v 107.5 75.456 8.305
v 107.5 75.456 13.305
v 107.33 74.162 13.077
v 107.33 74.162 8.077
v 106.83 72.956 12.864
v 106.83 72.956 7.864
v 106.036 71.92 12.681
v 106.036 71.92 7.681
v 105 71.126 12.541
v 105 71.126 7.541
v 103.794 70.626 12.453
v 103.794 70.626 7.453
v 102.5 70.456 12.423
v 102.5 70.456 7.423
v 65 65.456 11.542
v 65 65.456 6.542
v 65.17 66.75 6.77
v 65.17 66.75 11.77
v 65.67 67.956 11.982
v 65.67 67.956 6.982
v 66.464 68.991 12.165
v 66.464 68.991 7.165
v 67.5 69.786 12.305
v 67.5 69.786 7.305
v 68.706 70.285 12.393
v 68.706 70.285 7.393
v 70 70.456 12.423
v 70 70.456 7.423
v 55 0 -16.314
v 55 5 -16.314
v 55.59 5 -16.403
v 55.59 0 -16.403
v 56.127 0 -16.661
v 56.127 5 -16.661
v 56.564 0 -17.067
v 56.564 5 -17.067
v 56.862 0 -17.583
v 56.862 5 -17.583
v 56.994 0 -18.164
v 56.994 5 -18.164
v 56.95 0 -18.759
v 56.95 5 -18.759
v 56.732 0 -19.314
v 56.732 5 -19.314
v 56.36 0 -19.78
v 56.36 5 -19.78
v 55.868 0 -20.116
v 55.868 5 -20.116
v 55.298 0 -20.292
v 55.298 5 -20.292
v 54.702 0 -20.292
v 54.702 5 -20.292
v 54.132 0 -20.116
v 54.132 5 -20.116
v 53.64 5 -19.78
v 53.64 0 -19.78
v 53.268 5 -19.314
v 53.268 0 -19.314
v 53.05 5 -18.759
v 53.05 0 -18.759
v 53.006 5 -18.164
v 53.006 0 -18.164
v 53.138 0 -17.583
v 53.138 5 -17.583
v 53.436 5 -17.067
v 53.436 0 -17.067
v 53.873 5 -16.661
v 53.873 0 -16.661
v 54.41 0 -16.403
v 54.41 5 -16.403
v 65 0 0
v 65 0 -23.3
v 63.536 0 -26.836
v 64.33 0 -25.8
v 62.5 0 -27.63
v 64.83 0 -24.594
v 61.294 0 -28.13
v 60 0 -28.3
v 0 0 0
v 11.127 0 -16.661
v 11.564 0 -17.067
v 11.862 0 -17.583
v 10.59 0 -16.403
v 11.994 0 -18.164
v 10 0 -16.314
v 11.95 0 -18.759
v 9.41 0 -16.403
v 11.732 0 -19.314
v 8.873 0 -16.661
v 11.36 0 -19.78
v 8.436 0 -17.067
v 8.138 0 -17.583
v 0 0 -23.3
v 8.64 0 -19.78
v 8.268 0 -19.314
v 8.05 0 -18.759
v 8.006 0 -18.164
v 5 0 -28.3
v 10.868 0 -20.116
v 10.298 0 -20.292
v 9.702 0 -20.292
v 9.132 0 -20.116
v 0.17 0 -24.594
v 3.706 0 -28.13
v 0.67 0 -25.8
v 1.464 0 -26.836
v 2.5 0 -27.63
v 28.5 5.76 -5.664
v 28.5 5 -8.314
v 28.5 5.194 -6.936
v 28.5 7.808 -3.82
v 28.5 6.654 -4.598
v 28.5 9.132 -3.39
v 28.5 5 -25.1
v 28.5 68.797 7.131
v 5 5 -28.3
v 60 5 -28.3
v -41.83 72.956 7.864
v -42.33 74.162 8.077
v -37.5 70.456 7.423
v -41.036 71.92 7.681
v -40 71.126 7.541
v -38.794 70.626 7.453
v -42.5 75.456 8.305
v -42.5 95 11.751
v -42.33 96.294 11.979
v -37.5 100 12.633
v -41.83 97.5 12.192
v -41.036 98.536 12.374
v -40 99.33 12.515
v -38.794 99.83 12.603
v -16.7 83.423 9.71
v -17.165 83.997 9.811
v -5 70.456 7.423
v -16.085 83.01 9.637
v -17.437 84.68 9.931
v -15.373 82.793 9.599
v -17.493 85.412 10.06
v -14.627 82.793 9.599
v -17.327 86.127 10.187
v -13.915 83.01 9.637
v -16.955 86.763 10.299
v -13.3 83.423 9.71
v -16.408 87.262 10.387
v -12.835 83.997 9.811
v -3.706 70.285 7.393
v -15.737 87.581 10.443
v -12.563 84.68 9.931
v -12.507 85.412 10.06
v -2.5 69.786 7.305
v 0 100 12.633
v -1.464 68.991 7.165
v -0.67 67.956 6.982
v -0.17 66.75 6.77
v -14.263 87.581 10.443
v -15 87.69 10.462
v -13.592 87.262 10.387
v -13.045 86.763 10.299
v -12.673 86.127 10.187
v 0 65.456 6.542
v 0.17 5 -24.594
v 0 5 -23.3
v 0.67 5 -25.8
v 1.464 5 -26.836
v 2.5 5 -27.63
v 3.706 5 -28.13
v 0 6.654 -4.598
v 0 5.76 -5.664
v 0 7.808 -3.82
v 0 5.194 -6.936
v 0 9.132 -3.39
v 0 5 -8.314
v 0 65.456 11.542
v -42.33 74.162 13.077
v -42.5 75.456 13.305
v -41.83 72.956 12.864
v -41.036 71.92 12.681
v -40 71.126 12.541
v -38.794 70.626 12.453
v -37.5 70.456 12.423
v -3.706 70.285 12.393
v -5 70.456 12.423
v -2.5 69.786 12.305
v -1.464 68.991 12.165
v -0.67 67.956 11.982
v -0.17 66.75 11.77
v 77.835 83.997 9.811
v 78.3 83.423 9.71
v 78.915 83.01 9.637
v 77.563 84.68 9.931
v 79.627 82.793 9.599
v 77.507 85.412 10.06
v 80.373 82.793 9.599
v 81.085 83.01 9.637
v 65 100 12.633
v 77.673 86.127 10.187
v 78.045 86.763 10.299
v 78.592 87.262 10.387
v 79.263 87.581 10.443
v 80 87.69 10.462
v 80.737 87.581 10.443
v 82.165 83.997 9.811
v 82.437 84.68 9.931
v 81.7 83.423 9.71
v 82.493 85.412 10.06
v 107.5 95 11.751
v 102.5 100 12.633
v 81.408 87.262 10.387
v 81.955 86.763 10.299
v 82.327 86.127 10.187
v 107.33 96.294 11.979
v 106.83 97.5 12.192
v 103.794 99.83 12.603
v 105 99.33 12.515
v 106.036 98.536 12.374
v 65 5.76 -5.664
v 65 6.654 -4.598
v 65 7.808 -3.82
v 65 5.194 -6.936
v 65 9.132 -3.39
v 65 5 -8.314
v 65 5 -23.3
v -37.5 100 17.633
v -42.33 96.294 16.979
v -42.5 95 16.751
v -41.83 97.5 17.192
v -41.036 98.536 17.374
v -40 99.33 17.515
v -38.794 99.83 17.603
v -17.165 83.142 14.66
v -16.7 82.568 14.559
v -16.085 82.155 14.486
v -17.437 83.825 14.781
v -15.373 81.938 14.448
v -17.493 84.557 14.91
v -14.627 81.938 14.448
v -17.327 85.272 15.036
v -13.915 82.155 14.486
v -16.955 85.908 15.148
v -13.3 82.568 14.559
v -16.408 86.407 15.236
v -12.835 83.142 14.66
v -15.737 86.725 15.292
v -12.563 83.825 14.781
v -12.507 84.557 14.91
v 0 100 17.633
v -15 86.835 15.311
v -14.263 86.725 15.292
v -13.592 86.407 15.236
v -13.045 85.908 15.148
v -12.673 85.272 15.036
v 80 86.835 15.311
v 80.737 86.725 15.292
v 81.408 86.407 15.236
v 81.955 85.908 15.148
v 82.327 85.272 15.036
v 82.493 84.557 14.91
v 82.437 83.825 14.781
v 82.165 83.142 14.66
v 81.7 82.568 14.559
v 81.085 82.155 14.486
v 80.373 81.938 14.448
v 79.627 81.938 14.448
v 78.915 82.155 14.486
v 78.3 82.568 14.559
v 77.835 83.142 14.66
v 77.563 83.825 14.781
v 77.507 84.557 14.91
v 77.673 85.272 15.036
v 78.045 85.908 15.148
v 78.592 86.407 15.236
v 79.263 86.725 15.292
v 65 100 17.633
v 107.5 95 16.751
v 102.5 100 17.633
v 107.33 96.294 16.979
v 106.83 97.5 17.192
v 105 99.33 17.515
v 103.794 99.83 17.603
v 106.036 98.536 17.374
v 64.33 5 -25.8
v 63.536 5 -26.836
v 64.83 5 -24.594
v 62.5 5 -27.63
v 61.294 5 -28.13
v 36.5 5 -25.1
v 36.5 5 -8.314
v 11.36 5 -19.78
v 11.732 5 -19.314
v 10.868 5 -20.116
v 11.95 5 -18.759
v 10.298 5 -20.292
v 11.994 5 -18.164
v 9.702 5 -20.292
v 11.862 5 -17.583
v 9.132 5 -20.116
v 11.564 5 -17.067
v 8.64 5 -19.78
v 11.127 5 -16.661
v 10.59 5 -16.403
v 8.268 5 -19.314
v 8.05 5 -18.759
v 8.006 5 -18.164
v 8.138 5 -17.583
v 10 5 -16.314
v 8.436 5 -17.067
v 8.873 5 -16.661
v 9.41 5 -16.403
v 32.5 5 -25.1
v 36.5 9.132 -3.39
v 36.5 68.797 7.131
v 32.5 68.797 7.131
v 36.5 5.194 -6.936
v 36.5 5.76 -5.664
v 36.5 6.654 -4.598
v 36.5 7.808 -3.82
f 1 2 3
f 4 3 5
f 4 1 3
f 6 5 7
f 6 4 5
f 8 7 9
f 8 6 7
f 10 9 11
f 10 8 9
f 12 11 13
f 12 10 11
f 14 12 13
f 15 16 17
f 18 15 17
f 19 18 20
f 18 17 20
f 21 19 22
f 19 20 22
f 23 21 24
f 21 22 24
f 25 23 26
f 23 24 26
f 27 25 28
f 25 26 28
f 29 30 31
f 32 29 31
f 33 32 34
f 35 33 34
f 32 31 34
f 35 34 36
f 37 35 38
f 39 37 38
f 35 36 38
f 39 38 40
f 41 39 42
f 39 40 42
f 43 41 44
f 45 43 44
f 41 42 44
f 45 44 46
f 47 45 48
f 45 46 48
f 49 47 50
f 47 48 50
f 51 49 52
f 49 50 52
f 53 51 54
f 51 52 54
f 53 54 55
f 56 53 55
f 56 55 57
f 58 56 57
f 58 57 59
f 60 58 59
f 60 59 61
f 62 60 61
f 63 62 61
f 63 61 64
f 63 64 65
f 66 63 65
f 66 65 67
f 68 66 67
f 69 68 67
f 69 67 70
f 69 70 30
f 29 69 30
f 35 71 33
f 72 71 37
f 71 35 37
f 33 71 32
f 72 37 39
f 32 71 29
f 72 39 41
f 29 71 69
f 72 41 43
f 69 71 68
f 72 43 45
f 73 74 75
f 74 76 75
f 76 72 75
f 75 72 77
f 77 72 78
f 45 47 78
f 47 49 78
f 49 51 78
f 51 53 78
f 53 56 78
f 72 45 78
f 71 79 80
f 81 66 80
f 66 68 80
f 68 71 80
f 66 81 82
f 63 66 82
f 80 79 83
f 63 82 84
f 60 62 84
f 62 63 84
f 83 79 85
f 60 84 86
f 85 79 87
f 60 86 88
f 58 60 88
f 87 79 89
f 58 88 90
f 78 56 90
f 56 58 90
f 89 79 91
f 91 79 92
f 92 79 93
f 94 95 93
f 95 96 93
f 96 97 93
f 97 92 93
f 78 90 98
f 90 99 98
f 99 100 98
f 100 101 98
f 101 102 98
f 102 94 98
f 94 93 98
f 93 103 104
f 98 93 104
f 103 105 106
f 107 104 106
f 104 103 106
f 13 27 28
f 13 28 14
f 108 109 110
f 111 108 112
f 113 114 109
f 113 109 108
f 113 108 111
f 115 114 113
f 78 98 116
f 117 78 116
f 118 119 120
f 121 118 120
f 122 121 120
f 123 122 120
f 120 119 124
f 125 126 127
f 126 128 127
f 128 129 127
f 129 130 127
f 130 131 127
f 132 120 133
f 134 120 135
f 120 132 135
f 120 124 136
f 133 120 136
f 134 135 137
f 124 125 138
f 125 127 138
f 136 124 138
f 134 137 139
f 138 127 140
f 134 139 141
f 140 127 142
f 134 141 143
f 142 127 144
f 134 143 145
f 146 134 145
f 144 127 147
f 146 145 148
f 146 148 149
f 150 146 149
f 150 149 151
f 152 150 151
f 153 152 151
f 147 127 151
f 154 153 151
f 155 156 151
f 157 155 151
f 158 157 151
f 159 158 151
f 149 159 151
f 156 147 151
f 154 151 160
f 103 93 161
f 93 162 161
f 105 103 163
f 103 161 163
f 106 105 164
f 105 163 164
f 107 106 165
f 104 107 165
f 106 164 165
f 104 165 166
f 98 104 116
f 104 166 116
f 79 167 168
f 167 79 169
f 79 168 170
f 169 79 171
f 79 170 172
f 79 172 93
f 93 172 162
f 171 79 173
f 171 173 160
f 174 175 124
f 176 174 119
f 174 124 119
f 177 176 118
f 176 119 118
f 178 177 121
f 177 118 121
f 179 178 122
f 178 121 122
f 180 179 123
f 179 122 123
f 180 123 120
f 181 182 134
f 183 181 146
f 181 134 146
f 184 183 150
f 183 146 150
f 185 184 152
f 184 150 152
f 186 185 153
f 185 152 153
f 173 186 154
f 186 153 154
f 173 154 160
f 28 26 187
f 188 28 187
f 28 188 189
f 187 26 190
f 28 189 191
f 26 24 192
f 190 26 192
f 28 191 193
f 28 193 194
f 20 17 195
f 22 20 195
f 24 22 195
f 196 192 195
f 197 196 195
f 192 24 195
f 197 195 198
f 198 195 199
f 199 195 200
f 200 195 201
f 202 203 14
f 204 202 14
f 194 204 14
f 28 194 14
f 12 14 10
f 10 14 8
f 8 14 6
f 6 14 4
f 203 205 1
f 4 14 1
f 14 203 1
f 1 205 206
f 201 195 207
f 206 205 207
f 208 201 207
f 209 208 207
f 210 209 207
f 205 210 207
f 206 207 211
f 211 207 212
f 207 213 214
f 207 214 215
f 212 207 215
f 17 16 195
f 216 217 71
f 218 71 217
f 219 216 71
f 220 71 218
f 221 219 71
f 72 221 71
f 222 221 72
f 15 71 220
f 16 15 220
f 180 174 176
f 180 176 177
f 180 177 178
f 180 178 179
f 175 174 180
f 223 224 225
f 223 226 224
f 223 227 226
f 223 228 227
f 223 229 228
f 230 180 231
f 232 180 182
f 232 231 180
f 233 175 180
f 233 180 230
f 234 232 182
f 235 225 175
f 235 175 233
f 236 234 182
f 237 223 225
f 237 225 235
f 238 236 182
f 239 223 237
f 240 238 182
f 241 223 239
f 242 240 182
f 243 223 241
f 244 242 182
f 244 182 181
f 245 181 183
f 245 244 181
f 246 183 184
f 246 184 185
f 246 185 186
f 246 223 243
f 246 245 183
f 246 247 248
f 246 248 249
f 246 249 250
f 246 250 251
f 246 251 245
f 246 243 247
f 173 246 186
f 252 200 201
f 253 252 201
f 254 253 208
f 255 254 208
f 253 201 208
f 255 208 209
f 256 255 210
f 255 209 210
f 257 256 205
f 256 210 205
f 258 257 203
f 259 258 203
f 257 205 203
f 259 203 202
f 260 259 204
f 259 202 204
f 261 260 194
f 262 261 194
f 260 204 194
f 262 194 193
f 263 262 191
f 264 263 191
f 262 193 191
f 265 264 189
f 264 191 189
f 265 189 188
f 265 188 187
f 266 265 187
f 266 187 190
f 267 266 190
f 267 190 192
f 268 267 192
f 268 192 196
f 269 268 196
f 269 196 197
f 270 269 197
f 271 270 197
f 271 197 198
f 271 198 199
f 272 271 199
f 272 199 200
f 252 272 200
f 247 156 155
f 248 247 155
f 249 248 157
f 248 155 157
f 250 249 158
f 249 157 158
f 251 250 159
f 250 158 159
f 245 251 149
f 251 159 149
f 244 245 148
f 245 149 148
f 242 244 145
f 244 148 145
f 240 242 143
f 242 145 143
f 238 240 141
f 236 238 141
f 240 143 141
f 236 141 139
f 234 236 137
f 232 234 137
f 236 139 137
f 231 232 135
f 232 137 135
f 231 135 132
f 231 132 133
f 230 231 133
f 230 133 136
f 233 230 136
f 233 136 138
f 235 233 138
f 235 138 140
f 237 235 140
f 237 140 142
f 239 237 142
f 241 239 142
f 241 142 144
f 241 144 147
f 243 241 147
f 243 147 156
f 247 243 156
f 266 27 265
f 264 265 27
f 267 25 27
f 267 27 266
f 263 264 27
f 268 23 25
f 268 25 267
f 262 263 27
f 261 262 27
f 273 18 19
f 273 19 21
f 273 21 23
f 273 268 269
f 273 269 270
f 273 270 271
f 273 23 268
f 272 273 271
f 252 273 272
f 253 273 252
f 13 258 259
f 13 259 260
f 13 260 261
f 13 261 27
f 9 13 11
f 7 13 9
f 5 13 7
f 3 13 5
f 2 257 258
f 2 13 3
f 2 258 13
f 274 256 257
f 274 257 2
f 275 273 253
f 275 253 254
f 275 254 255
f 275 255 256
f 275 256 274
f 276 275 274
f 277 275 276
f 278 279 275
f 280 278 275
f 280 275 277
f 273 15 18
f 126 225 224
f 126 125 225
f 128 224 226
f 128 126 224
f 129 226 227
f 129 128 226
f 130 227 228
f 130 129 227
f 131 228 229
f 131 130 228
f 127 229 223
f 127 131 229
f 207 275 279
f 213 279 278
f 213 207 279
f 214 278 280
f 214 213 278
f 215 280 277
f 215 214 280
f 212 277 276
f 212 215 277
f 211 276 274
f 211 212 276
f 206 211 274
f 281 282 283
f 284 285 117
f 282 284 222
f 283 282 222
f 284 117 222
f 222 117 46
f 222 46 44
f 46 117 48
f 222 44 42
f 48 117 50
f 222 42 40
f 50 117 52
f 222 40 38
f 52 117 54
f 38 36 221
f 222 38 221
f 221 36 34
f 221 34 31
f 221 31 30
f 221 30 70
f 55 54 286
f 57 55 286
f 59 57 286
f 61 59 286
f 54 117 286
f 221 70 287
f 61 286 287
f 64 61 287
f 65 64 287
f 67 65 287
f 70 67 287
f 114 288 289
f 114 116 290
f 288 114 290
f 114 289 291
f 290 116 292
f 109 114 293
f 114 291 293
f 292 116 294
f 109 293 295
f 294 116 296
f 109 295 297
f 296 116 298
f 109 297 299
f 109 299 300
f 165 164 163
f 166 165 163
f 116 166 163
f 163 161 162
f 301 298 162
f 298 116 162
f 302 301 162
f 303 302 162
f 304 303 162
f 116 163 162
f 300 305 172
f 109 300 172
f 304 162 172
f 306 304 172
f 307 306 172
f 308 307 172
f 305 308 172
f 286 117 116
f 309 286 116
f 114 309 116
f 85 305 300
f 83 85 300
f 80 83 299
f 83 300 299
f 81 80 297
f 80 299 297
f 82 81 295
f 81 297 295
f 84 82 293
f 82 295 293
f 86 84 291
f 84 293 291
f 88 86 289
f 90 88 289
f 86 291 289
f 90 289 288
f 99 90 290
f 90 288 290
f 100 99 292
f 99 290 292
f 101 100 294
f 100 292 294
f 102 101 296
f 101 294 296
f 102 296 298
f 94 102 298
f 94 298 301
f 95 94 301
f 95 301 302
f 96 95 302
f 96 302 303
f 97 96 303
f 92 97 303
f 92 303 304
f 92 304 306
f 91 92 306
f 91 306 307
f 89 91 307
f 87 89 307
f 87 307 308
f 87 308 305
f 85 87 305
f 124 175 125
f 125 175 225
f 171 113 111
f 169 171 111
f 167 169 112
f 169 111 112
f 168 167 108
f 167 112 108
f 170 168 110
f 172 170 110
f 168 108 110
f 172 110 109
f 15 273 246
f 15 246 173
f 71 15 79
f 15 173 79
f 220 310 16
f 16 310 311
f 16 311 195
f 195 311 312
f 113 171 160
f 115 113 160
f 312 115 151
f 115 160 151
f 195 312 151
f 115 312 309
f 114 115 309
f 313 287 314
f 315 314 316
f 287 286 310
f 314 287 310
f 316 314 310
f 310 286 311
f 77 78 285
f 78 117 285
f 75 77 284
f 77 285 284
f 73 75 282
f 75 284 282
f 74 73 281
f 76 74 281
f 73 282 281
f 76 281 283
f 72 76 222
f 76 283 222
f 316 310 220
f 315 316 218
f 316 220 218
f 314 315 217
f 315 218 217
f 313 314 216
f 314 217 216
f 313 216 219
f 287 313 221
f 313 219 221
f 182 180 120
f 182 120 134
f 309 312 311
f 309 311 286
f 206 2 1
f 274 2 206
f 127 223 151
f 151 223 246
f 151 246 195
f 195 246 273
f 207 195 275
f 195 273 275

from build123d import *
from build123d.topology import SkipClean

# Parameters (mm, degrees)
BOSS_EXTRUDE1_DEPTH      = 65
SKETCH2_W                = 42.5
SKETCH2_H                = 30
BOSS_EXTRUDE2_DEPTH      = 5.000000239
FILLET1_R                = 5
CUT_EXTRUDE1_REACH       = 148.226
SKETCH3_R                = 2
SKETCH5_R                = 2.5
CUT_EXTRUDE2_DEPTH       = 149.107763403
BOSS_EXTRUDE3_DEPTH      = 4
BOSS_EXTRUDE3_DEPTH_BACK = 4


with BuildPart() as part:
    # Sketch1 → Boss-Extrude1 (new body)
    with BuildSketch(Plane(origin=(0, 0, 0), x_dir=(0, 0, -1), z_dir=(1, 0, 0))):
        Polygon((-17.632698071, 100), (0, 0), (28.3, 0), (28.3, 5), (4.118365096, 5), (-12.632698071, 100), align=None)
    extrude(amount=BOSS_EXTRUDE1_DEPTH)

    # Sketch2 → Boss-Extrude2 (add, along a direction that is not the sketch's normal)
    with SkipClean():  # the faces are left unmerged after this step: merging them gives an invalid solid
        with BuildSketch(Plane(origin=(0, 0, 0), x_dir=(1, 0, 0), z_dir=(0, -0.1736481776669274, 0.9848077530122086))):
            with Locations((-21.25, 86.542661189)):
                Rectangle(SKETCH2_W, SKETCH2_H)
            with Locations((86.25, 86.542661189)):
                Rectangle(SKETCH2_W, SKETCH2_H)
        extrude(amount=-BOSS_EXTRUDE2_DEPTH, dir=(0, 0, 1))

    # Fillet1
    fillet1_edges = [part.edges().sort_by_distance(p)[0] for p in [
        (32.5, 5, -4.118365096),
        (65, 2.5, -28.3),
        (0, 70.45576741, 9.923252622),
        (107.5, 70.45576741, 9.923252622),
        (65, 70.45576741, 9.923252622),
        (-42.5, 70.45576741, 9.923252622),
        (-42.5, 100, 15.132697952),
        (107.5, 100, 15.132697952),
        (0, 2.5, -28.3),
    ]]
    fillet(fillet1_edges, radius=FILLET1_R)

    # Sketch3 → Cut-Extrude1 (cut, up to next)
    with BuildSketch(Plane(origin=(0, 5, 0), x_dir=(1, 0, 0), z_dir=(0, 1, 0)), mode=Mode.PRIVATE) as cut_extrude1_sk1:
        with Locations(Location((10, 18.313863252, 0), (0, 0, 270))):
            Circle(SKETCH3_R)
    cut_extrude1_tool1 = extrude(cut_extrude1_sk1.sketch, amount=-CUT_EXTRUDE1_REACH, mode=Mode.PRIVATE) & part.part
    # Sketch3 → Cut-Extrude1 (cut, up to next)
    with BuildSketch(Plane(origin=(0, 5, 0), x_dir=(1, 0, 0), z_dir=(0, 1, 0)), mode=Mode.PRIVATE) as cut_extrude1_sk2:
        with Locations(Location((55, 18.313863252, 0), (0, 0, 270))):
            Circle(SKETCH3_R)
    cut_extrude1_tool2 = extrude(cut_extrude1_sk2.sketch, amount=-CUT_EXTRUDE1_REACH, mode=Mode.PRIVATE) & part.part
    add(cut_extrude1_tool1.solids().sort_by_distance((10, 5, -18.313863))[0], mode=Mode.SUBTRACT)
    add(cut_extrude1_tool2.solids().sort_by_distance((55, 5, -18.313863))[0], mode=Mode.SUBTRACT)

    # Sketch5 → Cut-Extrude2 (cut, through all)
    with SkipClean():  # the faces are left unmerged after this step: merging them gives an invalid solid
        with BuildSketch(Plane(origin=(0, 0.855050358, -4.849231552), x_dir=(-1, 0, 0), z_dir=(0, 0.1736481776669273, -0.9848077530122086))):
            with Locations(Location((-80, 85.6744203, 0), (0, 0, 90))):
                Circle(SKETCH5_R)
            with Locations(Location((15, 85.6744203, 0), (0, 0, 90))):
                Circle(SKETCH5_R)
        extrude(amount=-CUT_EXTRUDE2_DEPTH, mode=Mode.SUBTRACT)

    # Sketch9 → Boss-Extrude3 (add, two sides)
    with SkipClean():  # the faces are left unmerged after this step: merging them gives an invalid solid
        with BuildSketch(Plane.ZY.offset(-32.5)) as boss_extrude3_sk:
            with BuildLine():
                Line((-25.100344966, 5), (-8.313863252, 5))
                ThreePointArc((-8.313863252, 5), (-5.099925204, 6.169777784), (-3.389824487, 9.131759112))
                Line((-3.389824487, 9.131759112), (7.130723416, 68.796751166))
                Line((7.130723416, 68.796751166), (-25.100344966, 5))
            make_face()
        extrude(amount=BOSS_EXTRUDE3_DEPTH)
        extrude(boss_extrude3_sk.sketch, amount=-BOSS_EXTRUDE3_DEPTH_BACK)


solid = part.part
